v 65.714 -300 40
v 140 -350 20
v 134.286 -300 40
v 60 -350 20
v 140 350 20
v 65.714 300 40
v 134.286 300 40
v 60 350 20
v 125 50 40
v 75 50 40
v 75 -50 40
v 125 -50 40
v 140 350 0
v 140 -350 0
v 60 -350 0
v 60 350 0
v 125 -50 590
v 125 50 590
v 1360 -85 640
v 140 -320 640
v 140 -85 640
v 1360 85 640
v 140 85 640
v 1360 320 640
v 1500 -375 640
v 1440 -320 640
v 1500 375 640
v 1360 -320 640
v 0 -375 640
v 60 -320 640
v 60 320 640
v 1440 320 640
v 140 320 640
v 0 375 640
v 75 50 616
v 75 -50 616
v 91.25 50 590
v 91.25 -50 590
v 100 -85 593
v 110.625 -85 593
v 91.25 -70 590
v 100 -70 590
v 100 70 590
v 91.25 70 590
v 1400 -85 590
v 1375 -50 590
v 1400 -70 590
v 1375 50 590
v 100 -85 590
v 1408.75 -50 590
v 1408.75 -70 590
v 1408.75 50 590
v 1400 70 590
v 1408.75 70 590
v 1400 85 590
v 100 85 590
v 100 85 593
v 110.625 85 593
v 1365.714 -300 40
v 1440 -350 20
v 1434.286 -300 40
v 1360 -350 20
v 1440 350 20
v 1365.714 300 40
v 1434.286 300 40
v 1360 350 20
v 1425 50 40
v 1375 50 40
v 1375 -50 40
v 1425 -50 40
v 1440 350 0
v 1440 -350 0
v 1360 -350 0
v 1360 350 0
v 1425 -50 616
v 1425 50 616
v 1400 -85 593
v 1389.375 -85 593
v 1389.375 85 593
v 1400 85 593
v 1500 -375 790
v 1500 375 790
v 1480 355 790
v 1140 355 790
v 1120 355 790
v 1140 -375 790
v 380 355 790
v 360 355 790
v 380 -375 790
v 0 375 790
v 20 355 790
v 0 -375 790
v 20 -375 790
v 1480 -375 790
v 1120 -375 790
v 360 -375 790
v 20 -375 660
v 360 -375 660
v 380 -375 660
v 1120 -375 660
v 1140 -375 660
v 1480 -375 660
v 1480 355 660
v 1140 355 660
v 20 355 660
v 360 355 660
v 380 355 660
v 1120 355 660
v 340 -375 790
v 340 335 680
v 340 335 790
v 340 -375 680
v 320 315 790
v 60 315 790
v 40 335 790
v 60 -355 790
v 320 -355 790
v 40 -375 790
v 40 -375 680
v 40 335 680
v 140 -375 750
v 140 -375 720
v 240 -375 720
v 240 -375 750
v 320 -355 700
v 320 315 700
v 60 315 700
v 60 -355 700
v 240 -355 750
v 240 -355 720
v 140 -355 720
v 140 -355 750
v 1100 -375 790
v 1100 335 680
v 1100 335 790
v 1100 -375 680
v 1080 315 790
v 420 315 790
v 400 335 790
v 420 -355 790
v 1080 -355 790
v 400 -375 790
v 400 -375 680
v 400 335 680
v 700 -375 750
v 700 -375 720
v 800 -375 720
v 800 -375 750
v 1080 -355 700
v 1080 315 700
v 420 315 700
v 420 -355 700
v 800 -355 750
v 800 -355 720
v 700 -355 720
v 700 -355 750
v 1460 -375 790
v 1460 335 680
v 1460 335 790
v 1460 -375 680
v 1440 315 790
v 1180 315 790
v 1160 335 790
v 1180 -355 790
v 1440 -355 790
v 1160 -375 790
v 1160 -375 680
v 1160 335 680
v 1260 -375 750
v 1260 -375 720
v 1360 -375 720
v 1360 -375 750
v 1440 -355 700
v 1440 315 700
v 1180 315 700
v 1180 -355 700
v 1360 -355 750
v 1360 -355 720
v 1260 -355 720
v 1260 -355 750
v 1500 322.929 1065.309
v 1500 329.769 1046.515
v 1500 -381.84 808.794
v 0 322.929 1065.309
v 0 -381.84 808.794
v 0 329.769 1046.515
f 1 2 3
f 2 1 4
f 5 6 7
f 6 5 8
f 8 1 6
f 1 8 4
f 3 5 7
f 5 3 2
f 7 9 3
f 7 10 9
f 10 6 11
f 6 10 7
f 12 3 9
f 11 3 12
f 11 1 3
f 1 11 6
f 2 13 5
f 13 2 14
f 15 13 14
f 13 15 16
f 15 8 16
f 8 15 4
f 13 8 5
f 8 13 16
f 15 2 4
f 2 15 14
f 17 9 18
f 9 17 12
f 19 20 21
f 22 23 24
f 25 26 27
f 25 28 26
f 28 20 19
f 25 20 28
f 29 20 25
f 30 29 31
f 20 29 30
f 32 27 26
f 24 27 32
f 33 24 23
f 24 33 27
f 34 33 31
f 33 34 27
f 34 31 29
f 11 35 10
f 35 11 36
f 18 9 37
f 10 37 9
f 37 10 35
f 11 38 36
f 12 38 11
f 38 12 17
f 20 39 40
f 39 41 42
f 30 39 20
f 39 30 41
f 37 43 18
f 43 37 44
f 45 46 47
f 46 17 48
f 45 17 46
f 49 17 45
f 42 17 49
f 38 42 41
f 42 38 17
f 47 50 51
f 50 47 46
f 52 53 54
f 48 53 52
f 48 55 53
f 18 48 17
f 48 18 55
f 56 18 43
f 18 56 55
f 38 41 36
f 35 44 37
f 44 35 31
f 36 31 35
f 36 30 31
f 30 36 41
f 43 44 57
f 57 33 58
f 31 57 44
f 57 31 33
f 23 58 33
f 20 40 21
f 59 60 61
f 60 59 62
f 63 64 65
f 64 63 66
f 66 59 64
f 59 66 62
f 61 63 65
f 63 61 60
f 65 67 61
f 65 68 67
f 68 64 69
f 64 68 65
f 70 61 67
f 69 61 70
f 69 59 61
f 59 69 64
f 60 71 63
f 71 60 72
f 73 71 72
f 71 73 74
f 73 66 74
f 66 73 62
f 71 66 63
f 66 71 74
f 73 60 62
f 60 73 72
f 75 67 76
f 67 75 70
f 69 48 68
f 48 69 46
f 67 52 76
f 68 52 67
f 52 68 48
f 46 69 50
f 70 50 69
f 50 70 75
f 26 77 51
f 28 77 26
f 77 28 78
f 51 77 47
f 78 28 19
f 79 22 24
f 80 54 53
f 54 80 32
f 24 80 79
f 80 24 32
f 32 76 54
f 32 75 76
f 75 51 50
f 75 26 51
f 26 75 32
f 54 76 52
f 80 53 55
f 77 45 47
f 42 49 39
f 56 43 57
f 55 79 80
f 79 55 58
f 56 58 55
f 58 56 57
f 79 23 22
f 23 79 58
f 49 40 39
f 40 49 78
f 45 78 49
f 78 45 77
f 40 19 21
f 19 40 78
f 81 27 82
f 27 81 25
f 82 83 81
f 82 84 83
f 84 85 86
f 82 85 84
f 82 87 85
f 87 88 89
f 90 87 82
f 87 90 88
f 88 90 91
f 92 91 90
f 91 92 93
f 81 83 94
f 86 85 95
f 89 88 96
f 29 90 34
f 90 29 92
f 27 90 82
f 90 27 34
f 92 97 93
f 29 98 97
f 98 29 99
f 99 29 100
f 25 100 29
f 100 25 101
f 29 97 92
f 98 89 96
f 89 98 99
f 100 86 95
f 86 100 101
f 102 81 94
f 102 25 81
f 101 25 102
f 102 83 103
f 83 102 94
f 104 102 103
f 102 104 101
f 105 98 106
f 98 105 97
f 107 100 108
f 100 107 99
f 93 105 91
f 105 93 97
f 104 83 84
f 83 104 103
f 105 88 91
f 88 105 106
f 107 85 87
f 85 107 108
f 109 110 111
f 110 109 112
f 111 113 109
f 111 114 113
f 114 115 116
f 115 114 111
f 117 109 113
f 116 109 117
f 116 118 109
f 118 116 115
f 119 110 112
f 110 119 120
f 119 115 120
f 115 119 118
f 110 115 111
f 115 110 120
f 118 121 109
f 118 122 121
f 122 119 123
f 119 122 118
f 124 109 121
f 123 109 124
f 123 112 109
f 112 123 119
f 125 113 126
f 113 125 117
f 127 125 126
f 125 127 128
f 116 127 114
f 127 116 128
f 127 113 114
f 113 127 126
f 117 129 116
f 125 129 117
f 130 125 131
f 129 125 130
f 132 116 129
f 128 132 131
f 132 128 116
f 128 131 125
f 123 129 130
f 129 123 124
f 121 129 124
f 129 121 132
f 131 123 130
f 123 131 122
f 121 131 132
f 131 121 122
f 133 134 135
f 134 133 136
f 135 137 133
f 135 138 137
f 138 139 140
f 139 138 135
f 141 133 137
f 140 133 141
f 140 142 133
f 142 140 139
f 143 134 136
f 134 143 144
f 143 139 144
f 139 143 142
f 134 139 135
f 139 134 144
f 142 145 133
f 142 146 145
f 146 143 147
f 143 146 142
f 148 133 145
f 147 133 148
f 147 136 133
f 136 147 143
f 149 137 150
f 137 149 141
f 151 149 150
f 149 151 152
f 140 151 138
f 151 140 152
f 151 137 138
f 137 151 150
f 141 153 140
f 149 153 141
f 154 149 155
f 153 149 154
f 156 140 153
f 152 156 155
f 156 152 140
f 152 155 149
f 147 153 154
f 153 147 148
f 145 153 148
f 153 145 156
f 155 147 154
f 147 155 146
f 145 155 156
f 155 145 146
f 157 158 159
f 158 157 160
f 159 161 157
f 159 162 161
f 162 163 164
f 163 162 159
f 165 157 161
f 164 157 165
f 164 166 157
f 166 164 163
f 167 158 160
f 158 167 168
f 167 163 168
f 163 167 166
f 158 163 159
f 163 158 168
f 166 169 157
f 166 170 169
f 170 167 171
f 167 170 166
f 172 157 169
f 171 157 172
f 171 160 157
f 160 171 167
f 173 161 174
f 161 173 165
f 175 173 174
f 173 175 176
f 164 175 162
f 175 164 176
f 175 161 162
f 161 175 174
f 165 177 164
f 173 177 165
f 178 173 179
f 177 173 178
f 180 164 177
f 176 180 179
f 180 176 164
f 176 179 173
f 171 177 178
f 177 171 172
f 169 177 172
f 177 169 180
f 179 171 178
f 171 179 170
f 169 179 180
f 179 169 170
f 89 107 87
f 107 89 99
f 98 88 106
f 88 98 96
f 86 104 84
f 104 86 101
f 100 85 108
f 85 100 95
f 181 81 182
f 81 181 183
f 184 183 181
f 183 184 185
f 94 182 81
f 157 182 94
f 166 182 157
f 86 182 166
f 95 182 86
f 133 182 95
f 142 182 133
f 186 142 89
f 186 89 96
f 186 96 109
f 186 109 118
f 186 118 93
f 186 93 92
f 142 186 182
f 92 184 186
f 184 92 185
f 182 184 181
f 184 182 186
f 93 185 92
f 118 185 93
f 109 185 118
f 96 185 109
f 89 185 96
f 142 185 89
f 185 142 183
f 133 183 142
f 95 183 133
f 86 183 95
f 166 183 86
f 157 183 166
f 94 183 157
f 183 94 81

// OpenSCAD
// file: ../gospel.scad
/**
 * GOSPEL: George's OpenSCAD Procedural Enhancement Library
 * @author glaza
 *
 * Index:
 *      Translation: x, y, z, xy, xz, yz, xyz (displacement, variation)
 *      Scaling:     sx, sy, sz, sxy, sxz, syz, s (factor, variation)
 *      Rotation:    rx, ry, rz (angle, variation)
 *      Duplication: dx, dy, dz ()
 */
use <3rd_party/threads-library-by-cuiso-v1.scad>

/**
 * Translates the children in the X,Y,Z direction
 * @param d Displacement in X,Y,Z direction
 * @param variation The random variation + or - added to the displacement * 
 *  x      Translate X
 *  y      Translate Y
 *  z      Translate Z
 *  xy     Translate equaly in X and Y
 *  xz     Translate equaly in X and Z
 *  yz     Translate equaly in Y and Z
 *  xyz    Translate equaly in X, Y and Z
 */
function rand(value, variation=0) = value + rands(-variation,variation,1)[0]; 
 
module x(dx, variation=0) 
{   
    vx = rands(-variation,variation,1)[0];
    translate([dx+vx,0,0])
    children();
}
module y(dy, variation=0) 
{   
    vy = rands(-variation,variation,1)[0];
    translate([0,dy+vy,0])
    children();
} 
module z(dz, variation=0) 
{   
    vz = rands(-variation,variation,1)[0];
    translate([0,0,dz+vz])
    children();
}
module xy(d, variation=0) 
{   
    x(d, variation)
    y(d, variation)
    children();
}
module yz(d, variation=0) 
{   
    z(d, variation)
    y(d, variation)
    children();
}
module xz(d, variation=0) 
{   
    x(d, variation)
    z(d, variation)
    children();
}
module xyz(d, variation=0) 
{   
    xy(d, variation)
    z(d, variation)
    children();
}

/**
 * Rotates the children around the X axis
 * @param angle Degrees to rotate around the X axis
 * @param variation The random variation + or - added
 *  rx     Rotate around X
 *  ry     Rotate around Y
 *  rz     Rotate around Z
 */
module rx(angle, variation=0) 
{   
    v = rands(-variation,variation,1)[0];
    rotate([angle+v,0,0])
    children();
}
module ry(angle, variation=0) 
{   
    v = rands(-variation,variation,1)[0];
    rotate([0,angle+v,0])
    children();
}
module rz(angle, variation=0) 
{   
    v = rands(-variation,variation,1)[0];
    rotate([0,0,angle+v])
    children();
}

/**
 * Duplicates the children across the different planes.
 *      dx: YZ plane, dy: XZ plane, dz: XY plane
 */
module dx() 
{
    mirror([1,0,0])
    children();

    children();
}
module dy() 
{
    mirror([0,1,0])
    children();

    children();
}
module dz() 
{
    mirror([0,0,1])
    children();

    children();
}

/**
 * Mirrors across diferent planes.
 *      mx: YZ plane, my: XZ plane, mz: XY plane
 */
module mx() 
{
    mirror([1,0,0])
    children();
}
module my() 
{
    mirror([0,1,0])
    children();
}
module mz() 
{
    mirror([0,0,1])
    children();
}

/**
 * Scales in different directions
 *      mx: YZ plane, my: XZ plane, mz: XY plane
 */
module sx(factor, variation=0) 
{
    scaleFactor = rand(factor, variation);
    scale([scaleFactor,1,1])
    children();
}
module sy(factor, variation=0) 
{
    scaleFactor = rand(factor, variation);
    scale([1,scaleFactor,1])
    children();
}
module sz(factor, variation=0) 
{
    scaleFactor = rand(factor, variation);
    scale([1,1,scaleFactor])
    children();
}
module sxy(factor, variation=0) 
{
    sx(factor, variation)
    sy(factor, variation)
    children();
}
module syz(factor, variation=0) 
{
    sz(factor, variation)
    sy(factor, variation)
    children();
}
module sxz(factor, variation=0) 
{   
    sx(factor, variation)
    sz(factor, variation)
    children();
}
module s(factor, variation=0) 
{   
    sxy(factor, variation)
    sz(factor, variation)
    children();
}

/**
 * Shortcuts
 */
module diff() //does not work
{
    difference()
    {
        children();
    }
}


/**
 * Colours
 */
module red()     { color("Red") children(); }
module blue()    { color("RoyalBlue") children(); }
module green()   { color("Green") children(); }
module black()   { color("Black") children(); }
module white()   { color("White") children(); }
module cyan()    { color("Cyan") children(); }
module magenta() { color("Magenta") children(); }
module yellow()  { color("Yellow") children(); }
module glass()   { color([0.5, 0.5, 1], 0.25) children(); }

/**
 * shapes
 * @param size A vector passed to the cube
 * @param r The radius of the sphere
 * @param half Whether all corners or only top ones
 */
module rounded(size, r, half)
{
    radius = half
        ? min(r, 0.999*min(size[0]/2, size[1]/2, size[2]))
        : min(r, 0.999*min(size)/2);
    
    diameter = 2*radius;
    width = size[0] - diameter;
    height = size[1] - diameter;
    depth = half 
        ? (size[2] - radius) 
        : size[2] - diameter;
    shift = half ? radius : 0; 
    
    intersection()
    {
        z(-shift)
        xyz(radius)
        minkowski()
        {
            sphere(radius);
            cube([width,height,depth]);
        }
        
        cube(size);
    }
}

module screw(d, h, center=false) {
    z(center ? -h : 0)
    thread_for_screw(diameter=d - 1, length=h);
}

module thread(d, h, center=false) {
    z(center ? -h : 0)
    thread_for_nut(diameter=d, length=h); 
}
// main file
include <../gospel.scad>

DESK_WIDTH = 1500;
DESK_HEIGHT = 640;
DESK_DEPTH = 750;
DRAWER_HEIGHT = 150;
FRAME_WIDTH = 100;

PLYWOOD_THICKNESS = 20;

LIGHT_WOOD = "#deb887";
MEDIUM_WOOD = "#8b6914";
DARK_WOOD = "#443022";
DRAWRS_COLOR = DARK_WOOD;


color("white")
legs(DESK_WIDTH, DESK_HEIGHT);

z(DESK_HEIGHT)
drawers([DESK_WIDTH, DESK_DEPTH, DRAWER_HEIGHT]);


z(DESK_HEIGHT+DRAWER_HEIGHT)
y(-DESK_DEPTH/2) rx(20) y(DESK_DEPTH/2)
top([DESK_WIDTH, DESK_DEPTH, PLYWOOD_THICKNESS]);


module top(size=[1,1,1]) {
    y(-size.y/2) {
        color(DRAWRS_COLOR)
        difference() {
            cube(size);
            
            x(FRAME_WIDTH) y(FRAME_WIDTH) z(-size.z)
            cube([size.x-2*FRAME_WIDTH, size.y-2*FRAME_WIDTH, 3*size.z]);
        }
        
        // Glass
        color("#8888FF", 0.25)
        x(FRAME_WIDTH) y(FRAME_WIDTH)
        cube([size.x-2*FRAME_WIDTH, size.y-2*FRAME_WIDTH, size.z]);
    }
}

module drawers(size=[1,1,1]) {
    y(-size.y/2) {
        color(DRAWRS_COLOR)
        drawer(size, false);
        
       
        xz(2*PLYWOOD_THICKNESS) {
            
            color("white")
            drawer([300, size.y-2*PLYWOOD_THICKNESS, size.z-2*PLYWOOD_THICKNESS]);
            
            color(DRAWRS_COLOR)
            x(300+1*PLYWOOD_THICKNESS) z(-PLYWOOD_THICKNESS)
            cube([PLYWOOD_THICKNESS, size.y, size.z-PLYWOOD_THICKNESS]);
            
            color("white")
            x(300+3*PLYWOOD_THICKNESS) y(-0)
            drawer([700, size.y-2*PLYWOOD_THICKNESS, size.z-2*PLYWOOD_THICKNESS]);
            
            color(DRAWRS_COLOR)
            x(1000+4*PLYWOOD_THICKNESS) z(-PLYWOOD_THICKNESS)
            cube([PLYWOOD_THICKNESS, size.y, size.z-PLYWOOD_THICKNESS]);
            
            color("white")
            x(1000+6*PLYWOOD_THICKNESS) y(-0)
            drawer([300, size.y-2*PLYWOOD_THICKNESS, size.z-2*PLYWOOD_THICKNESS]);
        }
    }
}

module drawer(size=[1,1,1], front=true) {
    difference() {
        cube(size);
        
        x(PLYWOOD_THICKNESS)
        y(-PLYWOOD_THICKNESS)
        z(PLYWOOD_THICKNESS)
        cube([size.x-2*PLYWOOD_THICKNESS, size.y, size.z]);
        
    }
    if (front) {
        difference() {
            cube([size.x, PLYWOOD_THICKNESS, size.z]);
            x(size.x/2 - 50) y(-0.1) z(40)
            cube([100, 2*PLYWOOD_THICKNESS, 30]);
        }
    }
}


module legs(width, height) {
    x(100) leg(height);
    x(100) y(-170/2) z(height-50) cube([width-200, 170, 50]);
    x(width-100) leg(height);
}

module leg(height) {
    // foot
    z(20) beveledCube([80, 700, 20], 100);
    z(20/2) cube([80, 700, 20], center = true);
    
    // leg
    z(height/2) cube([50, 100, height], center = true);
    
    // arm
    z(height) mz() beveledCube([80, height, 50], 500);    
}

module beveledCube(size=[1,1,1], bevel=0.25) {
    sx(size.x/size.y)
    sxy(sqrt(2))
    rz(45)
    cylinder(h=size.z, d1=size.y, d2=size.y-bevel,  $fn=4);
}
